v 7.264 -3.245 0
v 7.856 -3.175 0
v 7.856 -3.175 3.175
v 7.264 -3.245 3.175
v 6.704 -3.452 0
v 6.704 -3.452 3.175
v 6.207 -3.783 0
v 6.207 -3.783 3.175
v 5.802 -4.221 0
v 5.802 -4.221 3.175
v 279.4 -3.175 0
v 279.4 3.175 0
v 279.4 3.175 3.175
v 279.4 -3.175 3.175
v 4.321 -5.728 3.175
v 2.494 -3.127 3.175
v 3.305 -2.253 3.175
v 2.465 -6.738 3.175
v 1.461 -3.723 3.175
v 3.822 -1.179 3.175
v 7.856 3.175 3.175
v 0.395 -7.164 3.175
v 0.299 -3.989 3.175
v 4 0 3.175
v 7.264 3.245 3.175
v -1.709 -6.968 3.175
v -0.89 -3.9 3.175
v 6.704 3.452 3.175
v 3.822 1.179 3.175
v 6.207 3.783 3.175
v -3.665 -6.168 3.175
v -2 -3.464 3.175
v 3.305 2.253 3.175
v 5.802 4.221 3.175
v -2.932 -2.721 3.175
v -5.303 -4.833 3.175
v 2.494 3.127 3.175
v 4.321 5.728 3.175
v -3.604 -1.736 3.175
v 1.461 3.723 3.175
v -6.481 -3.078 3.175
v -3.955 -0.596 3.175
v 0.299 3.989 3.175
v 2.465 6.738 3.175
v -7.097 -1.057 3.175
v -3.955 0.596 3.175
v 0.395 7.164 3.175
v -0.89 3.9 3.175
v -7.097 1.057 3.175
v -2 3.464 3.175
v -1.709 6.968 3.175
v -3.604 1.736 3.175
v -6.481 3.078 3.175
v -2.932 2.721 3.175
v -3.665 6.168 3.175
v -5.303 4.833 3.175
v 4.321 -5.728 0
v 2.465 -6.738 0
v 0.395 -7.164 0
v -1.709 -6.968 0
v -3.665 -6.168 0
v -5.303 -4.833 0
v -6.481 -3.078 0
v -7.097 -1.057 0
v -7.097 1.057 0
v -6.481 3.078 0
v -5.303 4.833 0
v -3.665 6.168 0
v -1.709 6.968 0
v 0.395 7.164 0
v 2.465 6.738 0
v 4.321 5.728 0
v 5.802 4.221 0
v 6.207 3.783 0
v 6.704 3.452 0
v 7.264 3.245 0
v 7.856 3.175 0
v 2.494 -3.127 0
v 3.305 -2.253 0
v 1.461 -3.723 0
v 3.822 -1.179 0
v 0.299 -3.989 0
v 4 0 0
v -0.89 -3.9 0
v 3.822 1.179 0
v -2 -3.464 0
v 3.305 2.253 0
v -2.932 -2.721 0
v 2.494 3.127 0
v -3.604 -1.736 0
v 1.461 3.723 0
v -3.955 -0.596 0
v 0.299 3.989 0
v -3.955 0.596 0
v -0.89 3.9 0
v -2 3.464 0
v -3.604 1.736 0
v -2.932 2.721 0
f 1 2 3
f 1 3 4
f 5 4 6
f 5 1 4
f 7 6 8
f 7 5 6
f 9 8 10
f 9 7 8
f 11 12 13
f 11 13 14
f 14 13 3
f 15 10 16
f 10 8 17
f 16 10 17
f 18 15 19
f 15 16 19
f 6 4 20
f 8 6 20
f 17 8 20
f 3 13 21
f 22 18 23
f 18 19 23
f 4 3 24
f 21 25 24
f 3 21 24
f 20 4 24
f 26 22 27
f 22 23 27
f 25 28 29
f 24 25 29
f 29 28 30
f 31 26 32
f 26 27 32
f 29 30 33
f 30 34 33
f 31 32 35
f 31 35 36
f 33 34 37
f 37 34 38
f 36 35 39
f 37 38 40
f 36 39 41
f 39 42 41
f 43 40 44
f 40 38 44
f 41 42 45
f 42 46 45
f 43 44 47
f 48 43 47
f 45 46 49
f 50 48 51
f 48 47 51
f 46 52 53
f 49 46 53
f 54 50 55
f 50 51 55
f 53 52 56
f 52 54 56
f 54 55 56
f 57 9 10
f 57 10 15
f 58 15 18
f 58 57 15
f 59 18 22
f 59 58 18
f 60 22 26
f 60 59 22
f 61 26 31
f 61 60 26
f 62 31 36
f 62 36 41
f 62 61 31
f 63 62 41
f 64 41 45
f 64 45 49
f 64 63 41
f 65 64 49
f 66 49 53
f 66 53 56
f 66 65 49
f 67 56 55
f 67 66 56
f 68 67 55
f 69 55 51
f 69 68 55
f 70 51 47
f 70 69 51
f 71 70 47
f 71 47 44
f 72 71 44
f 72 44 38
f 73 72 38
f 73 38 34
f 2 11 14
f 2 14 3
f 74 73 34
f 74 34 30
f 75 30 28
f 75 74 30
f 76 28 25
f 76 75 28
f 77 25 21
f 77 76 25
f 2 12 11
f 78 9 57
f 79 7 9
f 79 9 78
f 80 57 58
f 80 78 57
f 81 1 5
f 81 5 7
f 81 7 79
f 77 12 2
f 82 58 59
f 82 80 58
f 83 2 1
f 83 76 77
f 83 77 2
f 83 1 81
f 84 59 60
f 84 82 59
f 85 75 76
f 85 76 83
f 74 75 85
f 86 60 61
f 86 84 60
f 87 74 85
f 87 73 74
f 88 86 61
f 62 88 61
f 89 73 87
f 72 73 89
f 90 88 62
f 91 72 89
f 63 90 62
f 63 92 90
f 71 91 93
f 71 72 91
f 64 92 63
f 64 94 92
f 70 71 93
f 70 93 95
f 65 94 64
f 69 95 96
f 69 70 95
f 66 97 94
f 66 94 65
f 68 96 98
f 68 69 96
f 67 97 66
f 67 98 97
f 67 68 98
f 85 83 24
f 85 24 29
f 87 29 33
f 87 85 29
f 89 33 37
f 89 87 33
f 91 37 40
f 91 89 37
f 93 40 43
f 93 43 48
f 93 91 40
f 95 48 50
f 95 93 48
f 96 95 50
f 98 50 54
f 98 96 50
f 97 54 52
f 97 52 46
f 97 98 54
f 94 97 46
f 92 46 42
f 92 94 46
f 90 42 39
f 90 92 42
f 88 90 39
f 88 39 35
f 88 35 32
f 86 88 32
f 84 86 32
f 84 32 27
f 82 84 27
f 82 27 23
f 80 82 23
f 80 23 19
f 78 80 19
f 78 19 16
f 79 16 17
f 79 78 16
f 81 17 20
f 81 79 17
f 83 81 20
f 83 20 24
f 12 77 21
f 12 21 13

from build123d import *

# Parameters (mm, degrees)
SKETCH1_R           = 4
BOSS_EXTRUDE1_DEPTH = 3.175


with BuildPart() as part:
    # Sketch1 → Boss-Extrude1 (new body)
    with BuildSketch(Plane.XY):
        with BuildLine():
            Line((7.856207737, 3.175), (279.4, 3.175))
            Line((279.4, 3.175), (279.4, -3.175))
            Line((279.4, -3.175), (7.856207737, -3.175))
            ThreePointArc((7.856207737, -3.175), (6.703743885, -3.451501144), (5.802191509, -4.220805455))
            ThreePointArc((5.802191509, -4.220805455), (-7.175, 0), (5.802191509, 4.220805455))
            ThreePointArc((5.802191509, 4.220805455), (6.703743885, 3.451501144), (7.856207737, 3.175))
        make_face()
        Circle(SKETCH1_R, mode=Mode.SUBTRACT)
    extrude(amount=BOSS_EXTRUDE1_DEPTH)


solid = part.part
